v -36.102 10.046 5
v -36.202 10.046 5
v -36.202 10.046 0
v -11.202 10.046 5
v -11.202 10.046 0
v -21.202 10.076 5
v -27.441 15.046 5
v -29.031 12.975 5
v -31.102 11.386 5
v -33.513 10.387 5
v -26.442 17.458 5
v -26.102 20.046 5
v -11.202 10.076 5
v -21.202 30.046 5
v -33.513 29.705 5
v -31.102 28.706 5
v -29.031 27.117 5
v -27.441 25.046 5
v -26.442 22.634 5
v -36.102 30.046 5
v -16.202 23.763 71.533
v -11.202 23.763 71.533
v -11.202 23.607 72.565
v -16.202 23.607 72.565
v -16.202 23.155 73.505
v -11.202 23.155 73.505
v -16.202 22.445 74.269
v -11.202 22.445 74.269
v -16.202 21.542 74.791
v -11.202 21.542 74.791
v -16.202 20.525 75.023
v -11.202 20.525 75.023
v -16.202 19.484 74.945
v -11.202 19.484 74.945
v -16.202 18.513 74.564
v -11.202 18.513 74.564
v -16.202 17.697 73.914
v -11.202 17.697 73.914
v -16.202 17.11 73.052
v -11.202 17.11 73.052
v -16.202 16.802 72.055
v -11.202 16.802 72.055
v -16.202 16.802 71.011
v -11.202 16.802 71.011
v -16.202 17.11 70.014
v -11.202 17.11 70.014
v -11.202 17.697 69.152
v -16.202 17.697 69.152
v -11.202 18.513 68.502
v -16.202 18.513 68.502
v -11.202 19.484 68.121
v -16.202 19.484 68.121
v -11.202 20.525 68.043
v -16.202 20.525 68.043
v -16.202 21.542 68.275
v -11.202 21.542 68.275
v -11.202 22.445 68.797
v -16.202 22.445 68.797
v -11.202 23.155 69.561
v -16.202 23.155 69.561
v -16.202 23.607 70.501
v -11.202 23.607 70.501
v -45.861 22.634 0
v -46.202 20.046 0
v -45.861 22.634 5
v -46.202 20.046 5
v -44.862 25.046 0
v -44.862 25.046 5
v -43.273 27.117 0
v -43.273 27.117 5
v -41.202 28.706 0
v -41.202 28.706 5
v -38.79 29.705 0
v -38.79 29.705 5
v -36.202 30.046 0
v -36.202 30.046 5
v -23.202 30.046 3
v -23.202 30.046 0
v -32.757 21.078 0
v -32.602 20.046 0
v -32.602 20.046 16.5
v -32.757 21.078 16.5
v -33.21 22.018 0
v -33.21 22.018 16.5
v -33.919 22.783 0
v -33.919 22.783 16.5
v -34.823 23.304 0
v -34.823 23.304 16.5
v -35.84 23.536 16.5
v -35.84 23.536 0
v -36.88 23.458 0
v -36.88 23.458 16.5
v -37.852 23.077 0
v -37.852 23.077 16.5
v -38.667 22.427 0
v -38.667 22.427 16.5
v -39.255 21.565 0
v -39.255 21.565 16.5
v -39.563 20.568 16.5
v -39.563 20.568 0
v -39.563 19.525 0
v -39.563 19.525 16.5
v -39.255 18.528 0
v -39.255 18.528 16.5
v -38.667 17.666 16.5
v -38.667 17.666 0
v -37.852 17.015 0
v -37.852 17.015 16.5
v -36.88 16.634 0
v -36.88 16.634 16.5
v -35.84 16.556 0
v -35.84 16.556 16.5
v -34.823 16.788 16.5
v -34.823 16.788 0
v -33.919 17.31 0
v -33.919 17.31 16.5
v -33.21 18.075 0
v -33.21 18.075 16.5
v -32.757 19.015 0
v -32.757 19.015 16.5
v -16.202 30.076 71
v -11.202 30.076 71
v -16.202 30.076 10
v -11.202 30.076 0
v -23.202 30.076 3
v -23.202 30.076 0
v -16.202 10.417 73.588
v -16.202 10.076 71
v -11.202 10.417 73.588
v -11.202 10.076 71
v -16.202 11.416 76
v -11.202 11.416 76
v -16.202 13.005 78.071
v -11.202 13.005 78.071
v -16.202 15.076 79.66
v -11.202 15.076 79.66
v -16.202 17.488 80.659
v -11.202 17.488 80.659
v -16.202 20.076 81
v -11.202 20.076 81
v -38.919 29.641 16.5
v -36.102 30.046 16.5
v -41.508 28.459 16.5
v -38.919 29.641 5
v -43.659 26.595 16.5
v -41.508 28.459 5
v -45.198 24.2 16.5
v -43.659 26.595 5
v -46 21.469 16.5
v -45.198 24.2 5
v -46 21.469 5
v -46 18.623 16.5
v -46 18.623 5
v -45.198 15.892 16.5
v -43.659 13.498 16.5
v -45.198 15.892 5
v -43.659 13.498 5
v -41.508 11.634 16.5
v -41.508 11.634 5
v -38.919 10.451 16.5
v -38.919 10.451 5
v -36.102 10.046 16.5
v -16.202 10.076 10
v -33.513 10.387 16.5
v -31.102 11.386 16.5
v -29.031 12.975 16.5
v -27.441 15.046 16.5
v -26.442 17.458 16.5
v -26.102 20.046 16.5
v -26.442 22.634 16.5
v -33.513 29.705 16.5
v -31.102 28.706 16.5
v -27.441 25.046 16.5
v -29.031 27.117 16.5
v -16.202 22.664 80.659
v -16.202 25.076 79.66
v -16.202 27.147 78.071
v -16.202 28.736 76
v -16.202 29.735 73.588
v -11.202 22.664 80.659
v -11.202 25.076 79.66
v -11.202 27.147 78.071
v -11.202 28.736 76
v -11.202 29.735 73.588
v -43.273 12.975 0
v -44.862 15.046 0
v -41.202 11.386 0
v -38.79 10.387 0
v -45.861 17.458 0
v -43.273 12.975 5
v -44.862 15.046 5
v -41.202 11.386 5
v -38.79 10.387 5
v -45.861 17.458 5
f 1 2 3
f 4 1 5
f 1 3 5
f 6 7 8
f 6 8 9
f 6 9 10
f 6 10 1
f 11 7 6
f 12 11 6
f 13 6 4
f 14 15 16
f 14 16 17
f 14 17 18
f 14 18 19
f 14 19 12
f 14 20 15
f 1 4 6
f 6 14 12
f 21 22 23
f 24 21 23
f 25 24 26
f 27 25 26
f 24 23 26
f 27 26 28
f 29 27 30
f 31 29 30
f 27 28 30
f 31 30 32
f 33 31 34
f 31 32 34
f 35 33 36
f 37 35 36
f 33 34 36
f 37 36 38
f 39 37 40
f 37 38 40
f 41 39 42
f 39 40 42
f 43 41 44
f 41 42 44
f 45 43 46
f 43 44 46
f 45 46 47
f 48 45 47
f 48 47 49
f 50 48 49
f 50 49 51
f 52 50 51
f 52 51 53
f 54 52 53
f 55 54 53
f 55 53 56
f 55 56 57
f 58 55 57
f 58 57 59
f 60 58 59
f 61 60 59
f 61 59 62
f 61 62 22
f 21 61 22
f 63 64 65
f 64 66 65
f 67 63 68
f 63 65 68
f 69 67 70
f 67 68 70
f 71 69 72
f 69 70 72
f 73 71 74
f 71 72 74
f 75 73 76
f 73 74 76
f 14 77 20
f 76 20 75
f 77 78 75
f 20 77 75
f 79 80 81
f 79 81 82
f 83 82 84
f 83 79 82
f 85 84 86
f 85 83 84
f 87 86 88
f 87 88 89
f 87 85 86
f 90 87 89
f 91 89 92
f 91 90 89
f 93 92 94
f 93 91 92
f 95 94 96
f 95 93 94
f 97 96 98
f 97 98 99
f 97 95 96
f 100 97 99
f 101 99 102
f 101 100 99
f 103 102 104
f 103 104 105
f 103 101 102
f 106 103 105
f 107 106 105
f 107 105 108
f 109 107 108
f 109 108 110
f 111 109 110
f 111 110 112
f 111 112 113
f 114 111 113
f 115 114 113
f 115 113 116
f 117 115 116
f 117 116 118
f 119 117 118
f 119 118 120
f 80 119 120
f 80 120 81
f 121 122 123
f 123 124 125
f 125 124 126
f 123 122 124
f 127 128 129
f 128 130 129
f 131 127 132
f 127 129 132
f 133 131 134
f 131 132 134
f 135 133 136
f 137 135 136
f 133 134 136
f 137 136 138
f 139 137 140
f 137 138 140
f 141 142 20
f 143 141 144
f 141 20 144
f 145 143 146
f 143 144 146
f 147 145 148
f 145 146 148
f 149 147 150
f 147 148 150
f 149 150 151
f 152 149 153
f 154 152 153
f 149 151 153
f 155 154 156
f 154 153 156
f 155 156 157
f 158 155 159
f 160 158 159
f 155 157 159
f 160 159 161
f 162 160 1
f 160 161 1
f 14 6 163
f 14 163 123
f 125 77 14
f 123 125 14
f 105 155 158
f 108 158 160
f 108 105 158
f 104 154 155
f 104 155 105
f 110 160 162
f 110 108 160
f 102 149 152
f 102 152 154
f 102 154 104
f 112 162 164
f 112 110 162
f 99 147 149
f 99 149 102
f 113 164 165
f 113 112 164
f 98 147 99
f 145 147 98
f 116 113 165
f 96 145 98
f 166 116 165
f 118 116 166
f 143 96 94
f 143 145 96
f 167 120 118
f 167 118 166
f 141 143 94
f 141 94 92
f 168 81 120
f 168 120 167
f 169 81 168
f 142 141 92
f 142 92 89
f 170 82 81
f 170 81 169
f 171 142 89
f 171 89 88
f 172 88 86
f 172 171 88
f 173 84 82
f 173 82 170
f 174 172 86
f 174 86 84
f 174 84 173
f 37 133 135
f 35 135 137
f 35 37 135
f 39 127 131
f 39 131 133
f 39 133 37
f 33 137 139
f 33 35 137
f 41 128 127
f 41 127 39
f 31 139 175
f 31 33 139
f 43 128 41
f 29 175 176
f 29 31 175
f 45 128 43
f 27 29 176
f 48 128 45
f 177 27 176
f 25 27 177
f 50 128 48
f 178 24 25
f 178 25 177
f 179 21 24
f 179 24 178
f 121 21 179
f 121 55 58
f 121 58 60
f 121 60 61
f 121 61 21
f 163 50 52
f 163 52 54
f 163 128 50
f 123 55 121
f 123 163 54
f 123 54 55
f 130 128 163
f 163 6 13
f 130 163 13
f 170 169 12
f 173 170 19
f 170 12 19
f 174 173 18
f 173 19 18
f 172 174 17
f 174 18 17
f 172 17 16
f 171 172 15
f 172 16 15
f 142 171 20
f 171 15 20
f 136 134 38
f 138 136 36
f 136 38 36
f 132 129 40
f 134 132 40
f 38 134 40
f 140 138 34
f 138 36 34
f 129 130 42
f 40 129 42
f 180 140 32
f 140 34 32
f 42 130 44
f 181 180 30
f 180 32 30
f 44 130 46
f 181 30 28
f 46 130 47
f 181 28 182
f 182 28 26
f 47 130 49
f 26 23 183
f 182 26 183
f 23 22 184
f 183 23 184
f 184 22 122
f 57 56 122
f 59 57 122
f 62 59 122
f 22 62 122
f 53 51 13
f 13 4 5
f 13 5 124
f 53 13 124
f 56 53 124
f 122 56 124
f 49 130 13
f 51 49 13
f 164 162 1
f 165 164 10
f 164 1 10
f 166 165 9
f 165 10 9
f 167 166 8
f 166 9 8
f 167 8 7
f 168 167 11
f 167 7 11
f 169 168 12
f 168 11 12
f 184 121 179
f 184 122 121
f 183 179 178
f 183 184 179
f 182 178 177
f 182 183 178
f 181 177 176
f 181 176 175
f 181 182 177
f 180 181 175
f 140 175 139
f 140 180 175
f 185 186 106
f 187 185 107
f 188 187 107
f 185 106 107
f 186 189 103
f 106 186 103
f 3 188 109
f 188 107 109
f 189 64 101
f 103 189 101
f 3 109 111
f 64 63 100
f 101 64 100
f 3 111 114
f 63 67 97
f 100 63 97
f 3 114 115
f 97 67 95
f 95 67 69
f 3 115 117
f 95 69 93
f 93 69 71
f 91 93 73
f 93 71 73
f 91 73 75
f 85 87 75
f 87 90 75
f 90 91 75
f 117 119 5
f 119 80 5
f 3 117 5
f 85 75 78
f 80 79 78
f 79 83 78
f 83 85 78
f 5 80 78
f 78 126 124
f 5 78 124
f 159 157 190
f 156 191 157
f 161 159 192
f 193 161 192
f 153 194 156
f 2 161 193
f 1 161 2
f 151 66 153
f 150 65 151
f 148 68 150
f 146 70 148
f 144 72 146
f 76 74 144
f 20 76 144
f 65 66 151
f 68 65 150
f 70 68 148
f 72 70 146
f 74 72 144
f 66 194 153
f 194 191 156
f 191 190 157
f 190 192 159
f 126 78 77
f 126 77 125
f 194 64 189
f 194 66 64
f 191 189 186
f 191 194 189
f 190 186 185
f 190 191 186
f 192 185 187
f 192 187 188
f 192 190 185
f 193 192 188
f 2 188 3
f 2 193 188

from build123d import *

# Parameters (mm, degrees)
F0_R      = 3.5
F1_DEPTH  = 5
F2_R      = 9.99999
F4_START  = 5
F3_W      = 5
F3_H      = 20
F4_DEPTH  = 76
F5_R      = 3.5
F6_DEPTH  = 79.3
F7_R      = 9.99999
F8_DEPTH  = 16.5
F3_W_2    = 7
F9_DEPTH  = 10
F10_SIZE  = 6.99999
F11_DEPTH = 55.6


# Not quite as in the source:
# - a fillet or chamfer is up to 0.001 mm smaller than in the source, because OpenCascade refuses the exact size


with BuildPart() as f1:
    # F0 (on Top) → F1 (new body)
    with BuildSketch(Plane.XY):
        with BuildLine():
            Line((-36.1016022205, 30.0462352857), (-46.2016022205, 30.0462352857))
            Line((-46.2016022205, 30.0462352857), (-46.2016022205, 10.0462352857))
            Line((-46.2016022205, 10.0462352857), (-36.1016022205, 10.0462352857))
            ThreePointArc((-36.1016022205, 10.0462352857), (-46.1016022205, 20.0462352857), (-36.1016022205, 30.0462352857))
        make_face()
        with BuildLine():
            Line((-11.2016022205, 30.0462352857), (-36.1016022205, 30.0462352857))
            ThreePointArc((-36.1016022205, 30.0462352857), (-29.0305344087, 27.1173030976), (-26.1016022205, 20.0462352857))
            ThreePointArc((-26.1016022205, 20.0462352857), (-29.0305344087, 12.9751674738), (-36.1016022205, 10.0462352857))
            Line((-36.1016022205, 10.0462352857), (-11.2016022205, 10.0462352857))
            Line((-11.2016022205, 10.0462352857), (-11.2016022205, 30.0462352857))
        make_face()
        with BuildLine():
            ThreePointArc((-26.1016022205, 20.0462352857), (-29.0305344087, 27.1173030976), (-36.1016022205, 30.0462352857))
            ThreePointArc((-36.1016022205, 30.0462352857), (-46.1016022205, 20.0462352857), (-36.1016022205, 10.0462352857))
            ThreePointArc((-36.1016022205, 10.0462352857), (-29.0305344087, 12.9751674738), (-26.1016022205, 20.0462352857))
        make_face()
        with Locations((-36.1016022205, 20.0462352857)):
            Circle(F0_R, mode=Mode.SUBTRACT)
    extrude(amount=F1_DEPTH)

    # F2 (radius 10 in the source; OpenCascade refuses exactly that, so slightly less here)
    f2_edges = [f1.edges().sort_by_distance(p)[0] for p in [
        (-46.201602, 30.046235, 2.5),
        (-46.201602, 10.046235, 2.5),
    ]]
    fillet(f2_edges, radius=F2_R)

    # F3 (on Top) → F4 (join)
    with BuildSketch(Plane.XY.offset(F4_START)):
        with Locations((-13.7016022205, 20.0760087371)):
            Rectangle(F3_W, F3_H)
    extrude(amount=F4_DEPTH)

    # F5 (on Right) → F6 (cut)
    with BuildSketch(Plane.YZ):
        with Locations((20.2629771084, 71.5329723358)):
            Circle(F5_R)
    extrude(amount=F6_DEPTH, mode=Mode.SUBTRACT)

    # F7 (radius 10 in the source; OpenCascade refuses exactly that, so slightly less here)
    f7_edges = [f1.edges().sort_by_distance(p)[0] for p in [
        (-13.701602, 10.076009, 81),
        (-13.701602, 30.076009, 81),
    ]]
    fillet(f7_edges, radius=F7_R)

    # F0 (on Top) → F8 (join)
    with BuildSketch(Plane.XY):
        with BuildLine():
            ThreePointArc((-26.1016022205, 20.0462352857), (-29.0305344087, 27.1173030976), (-36.1016022205, 30.0462352857))
            ThreePointArc((-36.1016022205, 30.0462352857), (-46.1016022205, 20.0462352857), (-36.1016022205, 10.0462352857))
            ThreePointArc((-36.1016022205, 10.0462352857), (-29.0305344087, 12.9751674738), (-26.1016022205, 20.0462352857))
        make_face()
        with Locations((-36.1016022205, 20.0462352857)):
            Circle(F0_R, mode=Mode.SUBTRACT)
    extrude(amount=F8_DEPTH)

    # F3 (on Top) → F9 (join)
    with BuildSketch(Plane.XY):
        with Locations((-13.7016022205, 20.0760087371)):
            Rectangle(F3_W, F3_H)
        with Locations((-19.7016022205, 20.0760087371)):
            Rectangle(F3_W_2, F3_H)
    extrude(amount=F9_DEPTH)

    # F10 (size 7 in the source; OpenCascade refuses exactly that, so slightly less here)
    f10_edges = [f1.edges().sort_by_distance(p)[0] for p in [
        (-23.201602, 20.076009, 10),
    ]]
    chamfer(f10_edges, length=F10_SIZE)

    # F5 (on Right) → F11 (cut)
    with BuildSketch(Plane.YZ):
        with Locations((20.2629771084, 71.5329723358)):
            Circle(F5_R)
    extrude(amount=-F11_DEPTH, mode=Mode.SUBTRACT)


solid = f1.part
